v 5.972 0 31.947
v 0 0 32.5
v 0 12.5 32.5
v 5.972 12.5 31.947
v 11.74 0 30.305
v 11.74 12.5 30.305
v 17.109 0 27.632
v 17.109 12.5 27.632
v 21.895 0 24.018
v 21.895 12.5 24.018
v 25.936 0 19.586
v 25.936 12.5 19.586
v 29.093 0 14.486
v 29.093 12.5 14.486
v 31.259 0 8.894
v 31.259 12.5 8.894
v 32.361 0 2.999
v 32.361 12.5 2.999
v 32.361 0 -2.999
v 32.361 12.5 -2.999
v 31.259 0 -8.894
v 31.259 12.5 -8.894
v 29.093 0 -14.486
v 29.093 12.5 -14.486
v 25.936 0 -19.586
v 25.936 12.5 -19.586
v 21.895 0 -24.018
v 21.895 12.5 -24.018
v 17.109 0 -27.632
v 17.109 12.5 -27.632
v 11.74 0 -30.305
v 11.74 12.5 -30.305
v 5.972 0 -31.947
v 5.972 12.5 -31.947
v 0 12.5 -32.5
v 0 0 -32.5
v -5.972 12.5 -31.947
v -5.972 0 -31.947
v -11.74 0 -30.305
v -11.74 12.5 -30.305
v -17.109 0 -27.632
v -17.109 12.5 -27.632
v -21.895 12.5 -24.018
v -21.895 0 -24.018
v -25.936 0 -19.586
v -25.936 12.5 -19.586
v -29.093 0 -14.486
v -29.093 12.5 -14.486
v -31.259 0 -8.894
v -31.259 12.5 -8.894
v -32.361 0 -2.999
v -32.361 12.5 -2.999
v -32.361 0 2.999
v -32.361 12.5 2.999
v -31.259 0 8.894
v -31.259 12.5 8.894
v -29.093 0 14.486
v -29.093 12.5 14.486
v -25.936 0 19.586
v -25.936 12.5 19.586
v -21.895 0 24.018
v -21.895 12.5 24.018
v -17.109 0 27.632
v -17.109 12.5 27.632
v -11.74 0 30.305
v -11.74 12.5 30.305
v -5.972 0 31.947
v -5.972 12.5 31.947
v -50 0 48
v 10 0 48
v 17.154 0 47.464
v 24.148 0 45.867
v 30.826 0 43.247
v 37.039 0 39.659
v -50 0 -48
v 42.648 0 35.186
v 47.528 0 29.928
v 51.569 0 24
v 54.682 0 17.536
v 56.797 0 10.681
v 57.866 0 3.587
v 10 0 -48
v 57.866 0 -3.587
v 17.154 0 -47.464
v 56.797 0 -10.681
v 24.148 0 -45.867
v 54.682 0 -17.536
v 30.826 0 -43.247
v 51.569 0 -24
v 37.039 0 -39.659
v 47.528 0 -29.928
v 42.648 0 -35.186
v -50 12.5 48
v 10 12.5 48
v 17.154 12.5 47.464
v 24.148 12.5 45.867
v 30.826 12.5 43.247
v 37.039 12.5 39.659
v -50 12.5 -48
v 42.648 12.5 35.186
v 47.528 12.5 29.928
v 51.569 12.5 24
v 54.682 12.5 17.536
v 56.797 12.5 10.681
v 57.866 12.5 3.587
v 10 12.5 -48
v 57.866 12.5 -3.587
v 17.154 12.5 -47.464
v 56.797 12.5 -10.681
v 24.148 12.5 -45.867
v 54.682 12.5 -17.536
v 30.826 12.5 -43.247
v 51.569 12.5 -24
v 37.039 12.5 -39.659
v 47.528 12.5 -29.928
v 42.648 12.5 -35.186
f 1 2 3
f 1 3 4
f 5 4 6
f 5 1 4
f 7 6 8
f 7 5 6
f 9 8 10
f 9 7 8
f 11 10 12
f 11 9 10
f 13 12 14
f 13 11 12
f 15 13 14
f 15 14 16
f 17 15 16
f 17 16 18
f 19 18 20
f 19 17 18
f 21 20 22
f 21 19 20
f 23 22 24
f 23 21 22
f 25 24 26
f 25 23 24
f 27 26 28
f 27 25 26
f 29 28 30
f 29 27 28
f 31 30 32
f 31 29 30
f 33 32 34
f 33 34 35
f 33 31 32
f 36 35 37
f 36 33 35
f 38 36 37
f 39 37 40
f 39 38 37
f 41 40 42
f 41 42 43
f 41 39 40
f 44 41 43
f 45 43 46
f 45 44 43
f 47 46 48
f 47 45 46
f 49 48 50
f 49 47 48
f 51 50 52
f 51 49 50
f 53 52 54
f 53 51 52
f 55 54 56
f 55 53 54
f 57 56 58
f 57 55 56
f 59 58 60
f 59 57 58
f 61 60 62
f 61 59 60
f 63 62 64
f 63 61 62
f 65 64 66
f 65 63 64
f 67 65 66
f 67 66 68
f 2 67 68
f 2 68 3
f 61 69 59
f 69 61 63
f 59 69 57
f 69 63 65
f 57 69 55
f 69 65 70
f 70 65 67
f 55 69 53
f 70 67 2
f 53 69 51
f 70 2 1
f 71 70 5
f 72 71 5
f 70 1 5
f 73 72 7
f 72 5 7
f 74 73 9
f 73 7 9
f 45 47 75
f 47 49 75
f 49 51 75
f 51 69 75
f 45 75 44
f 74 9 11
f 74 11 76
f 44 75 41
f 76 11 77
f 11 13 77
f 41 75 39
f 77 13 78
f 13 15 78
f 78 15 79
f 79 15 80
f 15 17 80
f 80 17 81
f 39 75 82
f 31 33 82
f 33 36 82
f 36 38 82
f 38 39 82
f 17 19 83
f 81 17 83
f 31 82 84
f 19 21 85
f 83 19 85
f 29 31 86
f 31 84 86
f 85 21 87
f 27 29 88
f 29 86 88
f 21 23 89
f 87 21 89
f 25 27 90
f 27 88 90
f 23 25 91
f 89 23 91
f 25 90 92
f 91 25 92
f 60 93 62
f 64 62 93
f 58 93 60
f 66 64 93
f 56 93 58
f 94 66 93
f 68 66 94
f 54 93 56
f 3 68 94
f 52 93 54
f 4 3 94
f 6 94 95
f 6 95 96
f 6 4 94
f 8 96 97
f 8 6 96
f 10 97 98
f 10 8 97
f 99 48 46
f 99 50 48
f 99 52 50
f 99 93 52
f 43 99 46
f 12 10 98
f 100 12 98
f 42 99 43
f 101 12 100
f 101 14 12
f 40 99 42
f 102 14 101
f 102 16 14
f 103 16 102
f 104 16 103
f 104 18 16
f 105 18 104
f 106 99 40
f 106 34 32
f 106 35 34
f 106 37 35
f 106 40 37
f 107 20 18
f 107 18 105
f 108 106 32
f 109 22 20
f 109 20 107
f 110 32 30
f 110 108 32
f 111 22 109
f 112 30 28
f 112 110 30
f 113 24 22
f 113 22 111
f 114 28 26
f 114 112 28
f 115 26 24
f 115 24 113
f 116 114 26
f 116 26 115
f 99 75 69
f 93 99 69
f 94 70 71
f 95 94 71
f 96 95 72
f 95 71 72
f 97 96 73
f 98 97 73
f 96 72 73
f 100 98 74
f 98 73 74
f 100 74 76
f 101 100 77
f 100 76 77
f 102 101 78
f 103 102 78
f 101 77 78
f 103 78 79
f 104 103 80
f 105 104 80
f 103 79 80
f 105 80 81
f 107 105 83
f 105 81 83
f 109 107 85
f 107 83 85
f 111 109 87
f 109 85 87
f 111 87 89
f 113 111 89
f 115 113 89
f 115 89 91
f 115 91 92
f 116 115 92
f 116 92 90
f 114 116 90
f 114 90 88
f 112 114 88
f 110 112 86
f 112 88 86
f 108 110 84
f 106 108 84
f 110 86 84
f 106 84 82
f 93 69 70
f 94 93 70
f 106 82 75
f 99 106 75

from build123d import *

# Parameters (mm, degrees)
SKETCH1_R           = 32.5
BOSS_EXTRUDE1_DEPTH = 12.5


with BuildPart() as part:
    # Sketch1 → Boss-Extrude1 (new body)
    # profile 1 of 2: a face of its own
    with BuildSketch(Plane(origin=(0, 0, 0), x_dir=(1, 0, 0), z_dir=(0, 1, 0))):
        with BuildLine():
            Line((0, -48), (10, -48))
            ThreePointArc((10, -48), (58, 0), (10, 48))
            Line((10, 48), (0, 48))
            Line((0, 48), (-50, 48))
            Line((-50, 48), (-50, -48))
            Line((-50, -48), (0, -48))
        make_face()
        with BuildLine():
            ThreePointArc((10, -40), (50, 0), (10, 40))
            Line((10, 40), (0, 40))
            Line((0, 40), (-42, 40))
            Line((-42, 40), (-42, -40))
            Line((-42, -40), (0, -40))
            Line((0, -40), (10, -40))
        make_face(mode=Mode.SUBTRACT)
    # profile 2 of 2: a face of its own
    with BuildSketch(Plane(origin=(0, 0, 0), x_dir=(1, 0, 0), z_dir=(0, 1, 0))):
        with BuildLine():
            Line((0, -40), (10, -40))
            ThreePointArc((10, -40), (50, 0), (10, 40))
            Line((10, 40), (0, 40))
            Line((0, 40), (-42, 40))
            Line((-42, 40), (-42, -40))
            Line((-42, -40), (0, -40))
        make_face()
        with Locations(Location((0, 0, 0), (0, 0, 270))):
            Circle(SKETCH1_R, mode=Mode.SUBTRACT)
    extrude(amount=BOSS_EXTRUDE1_DEPTH)


solid = part.part
